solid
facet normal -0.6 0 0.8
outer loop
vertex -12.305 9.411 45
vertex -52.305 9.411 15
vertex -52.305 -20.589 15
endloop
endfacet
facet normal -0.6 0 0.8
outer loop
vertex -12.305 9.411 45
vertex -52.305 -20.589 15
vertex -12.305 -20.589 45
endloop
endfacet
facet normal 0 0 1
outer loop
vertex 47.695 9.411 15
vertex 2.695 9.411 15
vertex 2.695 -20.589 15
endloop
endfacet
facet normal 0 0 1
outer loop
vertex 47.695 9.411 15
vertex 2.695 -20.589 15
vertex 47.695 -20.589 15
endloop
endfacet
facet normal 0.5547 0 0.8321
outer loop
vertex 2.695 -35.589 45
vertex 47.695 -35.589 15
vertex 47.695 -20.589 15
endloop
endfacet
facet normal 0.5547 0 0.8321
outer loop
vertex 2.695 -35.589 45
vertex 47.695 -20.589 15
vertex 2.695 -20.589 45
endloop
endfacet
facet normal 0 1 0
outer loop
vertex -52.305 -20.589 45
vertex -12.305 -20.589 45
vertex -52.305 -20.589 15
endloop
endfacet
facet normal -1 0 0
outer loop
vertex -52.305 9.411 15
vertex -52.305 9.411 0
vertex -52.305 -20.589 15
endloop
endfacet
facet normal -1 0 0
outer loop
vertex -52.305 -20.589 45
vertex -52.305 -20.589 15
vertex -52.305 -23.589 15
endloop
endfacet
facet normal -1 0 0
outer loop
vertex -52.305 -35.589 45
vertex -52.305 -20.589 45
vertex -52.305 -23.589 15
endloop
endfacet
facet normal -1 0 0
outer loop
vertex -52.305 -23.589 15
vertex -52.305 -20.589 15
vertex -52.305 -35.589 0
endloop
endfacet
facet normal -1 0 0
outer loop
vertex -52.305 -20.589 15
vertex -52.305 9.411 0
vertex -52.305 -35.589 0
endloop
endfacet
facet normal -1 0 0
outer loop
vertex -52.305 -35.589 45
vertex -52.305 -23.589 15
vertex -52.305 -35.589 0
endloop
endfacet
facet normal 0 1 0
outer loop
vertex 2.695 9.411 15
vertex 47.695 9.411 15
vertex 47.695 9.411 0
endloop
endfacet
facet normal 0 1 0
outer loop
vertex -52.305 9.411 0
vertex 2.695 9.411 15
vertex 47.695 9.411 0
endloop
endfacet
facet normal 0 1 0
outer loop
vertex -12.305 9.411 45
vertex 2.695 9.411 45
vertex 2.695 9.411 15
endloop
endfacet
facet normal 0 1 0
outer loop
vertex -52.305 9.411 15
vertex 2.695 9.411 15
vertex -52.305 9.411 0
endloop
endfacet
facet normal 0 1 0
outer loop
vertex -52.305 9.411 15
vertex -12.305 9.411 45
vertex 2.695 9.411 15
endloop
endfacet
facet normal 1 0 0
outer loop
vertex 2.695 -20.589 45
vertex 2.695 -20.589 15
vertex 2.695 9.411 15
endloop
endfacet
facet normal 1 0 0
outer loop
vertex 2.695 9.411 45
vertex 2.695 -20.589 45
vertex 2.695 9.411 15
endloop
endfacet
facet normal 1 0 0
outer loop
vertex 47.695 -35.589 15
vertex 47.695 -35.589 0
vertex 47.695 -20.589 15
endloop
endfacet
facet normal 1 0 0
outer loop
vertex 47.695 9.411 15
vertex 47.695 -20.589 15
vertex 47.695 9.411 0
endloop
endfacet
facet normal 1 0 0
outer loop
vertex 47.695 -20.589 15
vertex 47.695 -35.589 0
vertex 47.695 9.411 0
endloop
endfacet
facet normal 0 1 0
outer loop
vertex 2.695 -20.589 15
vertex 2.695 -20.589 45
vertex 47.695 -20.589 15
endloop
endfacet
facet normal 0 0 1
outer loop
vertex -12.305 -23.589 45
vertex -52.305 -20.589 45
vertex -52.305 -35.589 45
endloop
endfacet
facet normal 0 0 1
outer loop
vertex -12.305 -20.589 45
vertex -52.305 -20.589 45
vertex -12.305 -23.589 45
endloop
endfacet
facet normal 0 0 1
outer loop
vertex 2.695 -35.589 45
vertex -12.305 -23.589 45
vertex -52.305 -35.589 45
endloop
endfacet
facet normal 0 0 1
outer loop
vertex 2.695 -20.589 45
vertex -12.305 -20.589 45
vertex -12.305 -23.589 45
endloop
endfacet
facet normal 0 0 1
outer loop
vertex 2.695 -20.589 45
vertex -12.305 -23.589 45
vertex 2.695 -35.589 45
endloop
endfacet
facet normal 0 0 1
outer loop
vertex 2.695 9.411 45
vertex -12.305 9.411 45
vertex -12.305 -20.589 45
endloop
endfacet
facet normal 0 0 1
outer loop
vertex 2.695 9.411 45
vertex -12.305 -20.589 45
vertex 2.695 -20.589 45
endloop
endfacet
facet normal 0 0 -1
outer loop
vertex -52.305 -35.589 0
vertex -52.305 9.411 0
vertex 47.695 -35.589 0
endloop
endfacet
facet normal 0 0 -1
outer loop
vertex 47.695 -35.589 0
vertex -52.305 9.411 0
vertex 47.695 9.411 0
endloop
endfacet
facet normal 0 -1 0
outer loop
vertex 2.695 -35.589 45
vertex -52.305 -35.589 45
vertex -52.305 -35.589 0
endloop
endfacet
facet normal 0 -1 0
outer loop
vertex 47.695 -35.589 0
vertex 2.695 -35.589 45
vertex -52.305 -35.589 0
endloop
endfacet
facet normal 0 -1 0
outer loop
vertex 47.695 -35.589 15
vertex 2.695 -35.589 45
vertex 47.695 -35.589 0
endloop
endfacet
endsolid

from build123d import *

# Parameters (mm, degrees)
F0_W     = 100
F0_H     = 45
F1_DEPTH = 15
F3_DEPTH = 30
F5_DEPTH = 33
F7_DEPTH = 15


with BuildPart() as f1:
    # F0 (on Top) → F1 (new body)
    with BuildSketch(Plane.XY):
        with Locations((-2.304982, -13.08857)):
            Rectangle(F0_W, F0_H)
    extrude(amount=F1_DEPTH)

    # F2 (on face) → F3 (join)
    with BuildSketch(Plane.XY.offset(15)):
        Polygon((2.695018, -35.58857), (2.695018, 9.41143), (-12.304982, 9.41143), (-12.304982, -20.58857), (-52.304982, -20.58857), (-52.304982, -35.58857), (-12.304982, -35.58857), align=None)
    extrude(amount=F3_DEPTH)

    # F4 (on face) → F5 (join)
    with BuildSketch(Plane(origin=(0, 9.41143, 0), x_dir=(-1, 0, 0), z_dir=(0, 1, 0))):
        Polygon((52.304982, 15), (12.304982, 45), (12.304982, 15), align=None)
    extrude(amount=-F5_DEPTH)

    # F6 (on face) → F7 (join)
    with BuildSketch(Plane.XZ.offset(35.58857)):
        Polygon((47.695018, 15), (2.695018, 45), (2.695018, 15), align=None)
    extrude(amount=-F7_DEPTH)


solid = f1.part
